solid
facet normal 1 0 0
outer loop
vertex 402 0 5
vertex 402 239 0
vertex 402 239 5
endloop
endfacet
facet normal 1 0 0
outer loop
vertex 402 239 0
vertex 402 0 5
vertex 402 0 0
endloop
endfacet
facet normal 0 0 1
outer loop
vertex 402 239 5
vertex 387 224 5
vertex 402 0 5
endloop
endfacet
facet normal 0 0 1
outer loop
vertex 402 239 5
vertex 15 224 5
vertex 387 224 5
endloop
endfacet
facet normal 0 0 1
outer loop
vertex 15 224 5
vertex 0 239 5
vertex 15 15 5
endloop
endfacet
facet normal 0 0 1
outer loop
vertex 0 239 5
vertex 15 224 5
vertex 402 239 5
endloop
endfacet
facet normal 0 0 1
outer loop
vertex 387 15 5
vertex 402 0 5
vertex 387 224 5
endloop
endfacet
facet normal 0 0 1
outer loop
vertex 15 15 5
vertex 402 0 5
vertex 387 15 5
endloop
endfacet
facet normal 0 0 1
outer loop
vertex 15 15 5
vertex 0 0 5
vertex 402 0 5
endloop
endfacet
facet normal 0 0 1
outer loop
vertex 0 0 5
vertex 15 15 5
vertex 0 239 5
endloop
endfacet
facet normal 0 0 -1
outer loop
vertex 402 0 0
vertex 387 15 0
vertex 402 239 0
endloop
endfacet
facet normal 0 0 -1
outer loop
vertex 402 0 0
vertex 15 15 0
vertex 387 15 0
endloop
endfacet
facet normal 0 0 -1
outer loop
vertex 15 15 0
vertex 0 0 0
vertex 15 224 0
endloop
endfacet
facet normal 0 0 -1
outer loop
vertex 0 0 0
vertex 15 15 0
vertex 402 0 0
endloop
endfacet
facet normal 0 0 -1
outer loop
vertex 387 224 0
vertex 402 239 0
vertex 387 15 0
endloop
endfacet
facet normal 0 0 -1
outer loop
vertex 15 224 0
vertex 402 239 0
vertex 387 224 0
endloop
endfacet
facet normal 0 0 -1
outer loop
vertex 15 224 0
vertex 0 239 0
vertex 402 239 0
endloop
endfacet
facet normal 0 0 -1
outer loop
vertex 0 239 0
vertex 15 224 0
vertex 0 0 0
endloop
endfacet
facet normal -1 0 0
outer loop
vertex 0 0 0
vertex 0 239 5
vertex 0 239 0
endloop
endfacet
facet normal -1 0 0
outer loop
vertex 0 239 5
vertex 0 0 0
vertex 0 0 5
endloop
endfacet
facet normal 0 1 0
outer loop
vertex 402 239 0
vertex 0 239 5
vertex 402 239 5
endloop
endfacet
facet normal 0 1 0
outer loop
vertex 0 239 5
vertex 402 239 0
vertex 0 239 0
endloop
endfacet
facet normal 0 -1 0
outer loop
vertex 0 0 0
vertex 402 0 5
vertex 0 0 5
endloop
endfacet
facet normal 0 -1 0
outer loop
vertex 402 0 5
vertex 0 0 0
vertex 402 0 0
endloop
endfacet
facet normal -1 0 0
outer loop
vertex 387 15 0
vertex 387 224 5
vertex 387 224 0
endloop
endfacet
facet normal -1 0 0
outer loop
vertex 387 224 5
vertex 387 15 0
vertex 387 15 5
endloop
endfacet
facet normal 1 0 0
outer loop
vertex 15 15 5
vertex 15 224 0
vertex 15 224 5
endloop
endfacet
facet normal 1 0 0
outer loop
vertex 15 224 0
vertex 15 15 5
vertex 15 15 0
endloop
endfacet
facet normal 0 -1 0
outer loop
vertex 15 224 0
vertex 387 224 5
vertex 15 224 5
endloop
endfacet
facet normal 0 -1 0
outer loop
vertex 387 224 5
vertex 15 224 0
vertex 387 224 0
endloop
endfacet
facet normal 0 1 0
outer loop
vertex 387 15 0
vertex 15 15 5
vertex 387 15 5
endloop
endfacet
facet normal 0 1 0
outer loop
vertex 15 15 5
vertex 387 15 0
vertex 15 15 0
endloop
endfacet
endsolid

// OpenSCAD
length = 372;
height= 209;
width = 5;

offset = 30;

difference(){
   cube([length + offset, height + offset, width]);
    translate([offset/2, offset/2 , 0])cube([length, height, width]);
}
